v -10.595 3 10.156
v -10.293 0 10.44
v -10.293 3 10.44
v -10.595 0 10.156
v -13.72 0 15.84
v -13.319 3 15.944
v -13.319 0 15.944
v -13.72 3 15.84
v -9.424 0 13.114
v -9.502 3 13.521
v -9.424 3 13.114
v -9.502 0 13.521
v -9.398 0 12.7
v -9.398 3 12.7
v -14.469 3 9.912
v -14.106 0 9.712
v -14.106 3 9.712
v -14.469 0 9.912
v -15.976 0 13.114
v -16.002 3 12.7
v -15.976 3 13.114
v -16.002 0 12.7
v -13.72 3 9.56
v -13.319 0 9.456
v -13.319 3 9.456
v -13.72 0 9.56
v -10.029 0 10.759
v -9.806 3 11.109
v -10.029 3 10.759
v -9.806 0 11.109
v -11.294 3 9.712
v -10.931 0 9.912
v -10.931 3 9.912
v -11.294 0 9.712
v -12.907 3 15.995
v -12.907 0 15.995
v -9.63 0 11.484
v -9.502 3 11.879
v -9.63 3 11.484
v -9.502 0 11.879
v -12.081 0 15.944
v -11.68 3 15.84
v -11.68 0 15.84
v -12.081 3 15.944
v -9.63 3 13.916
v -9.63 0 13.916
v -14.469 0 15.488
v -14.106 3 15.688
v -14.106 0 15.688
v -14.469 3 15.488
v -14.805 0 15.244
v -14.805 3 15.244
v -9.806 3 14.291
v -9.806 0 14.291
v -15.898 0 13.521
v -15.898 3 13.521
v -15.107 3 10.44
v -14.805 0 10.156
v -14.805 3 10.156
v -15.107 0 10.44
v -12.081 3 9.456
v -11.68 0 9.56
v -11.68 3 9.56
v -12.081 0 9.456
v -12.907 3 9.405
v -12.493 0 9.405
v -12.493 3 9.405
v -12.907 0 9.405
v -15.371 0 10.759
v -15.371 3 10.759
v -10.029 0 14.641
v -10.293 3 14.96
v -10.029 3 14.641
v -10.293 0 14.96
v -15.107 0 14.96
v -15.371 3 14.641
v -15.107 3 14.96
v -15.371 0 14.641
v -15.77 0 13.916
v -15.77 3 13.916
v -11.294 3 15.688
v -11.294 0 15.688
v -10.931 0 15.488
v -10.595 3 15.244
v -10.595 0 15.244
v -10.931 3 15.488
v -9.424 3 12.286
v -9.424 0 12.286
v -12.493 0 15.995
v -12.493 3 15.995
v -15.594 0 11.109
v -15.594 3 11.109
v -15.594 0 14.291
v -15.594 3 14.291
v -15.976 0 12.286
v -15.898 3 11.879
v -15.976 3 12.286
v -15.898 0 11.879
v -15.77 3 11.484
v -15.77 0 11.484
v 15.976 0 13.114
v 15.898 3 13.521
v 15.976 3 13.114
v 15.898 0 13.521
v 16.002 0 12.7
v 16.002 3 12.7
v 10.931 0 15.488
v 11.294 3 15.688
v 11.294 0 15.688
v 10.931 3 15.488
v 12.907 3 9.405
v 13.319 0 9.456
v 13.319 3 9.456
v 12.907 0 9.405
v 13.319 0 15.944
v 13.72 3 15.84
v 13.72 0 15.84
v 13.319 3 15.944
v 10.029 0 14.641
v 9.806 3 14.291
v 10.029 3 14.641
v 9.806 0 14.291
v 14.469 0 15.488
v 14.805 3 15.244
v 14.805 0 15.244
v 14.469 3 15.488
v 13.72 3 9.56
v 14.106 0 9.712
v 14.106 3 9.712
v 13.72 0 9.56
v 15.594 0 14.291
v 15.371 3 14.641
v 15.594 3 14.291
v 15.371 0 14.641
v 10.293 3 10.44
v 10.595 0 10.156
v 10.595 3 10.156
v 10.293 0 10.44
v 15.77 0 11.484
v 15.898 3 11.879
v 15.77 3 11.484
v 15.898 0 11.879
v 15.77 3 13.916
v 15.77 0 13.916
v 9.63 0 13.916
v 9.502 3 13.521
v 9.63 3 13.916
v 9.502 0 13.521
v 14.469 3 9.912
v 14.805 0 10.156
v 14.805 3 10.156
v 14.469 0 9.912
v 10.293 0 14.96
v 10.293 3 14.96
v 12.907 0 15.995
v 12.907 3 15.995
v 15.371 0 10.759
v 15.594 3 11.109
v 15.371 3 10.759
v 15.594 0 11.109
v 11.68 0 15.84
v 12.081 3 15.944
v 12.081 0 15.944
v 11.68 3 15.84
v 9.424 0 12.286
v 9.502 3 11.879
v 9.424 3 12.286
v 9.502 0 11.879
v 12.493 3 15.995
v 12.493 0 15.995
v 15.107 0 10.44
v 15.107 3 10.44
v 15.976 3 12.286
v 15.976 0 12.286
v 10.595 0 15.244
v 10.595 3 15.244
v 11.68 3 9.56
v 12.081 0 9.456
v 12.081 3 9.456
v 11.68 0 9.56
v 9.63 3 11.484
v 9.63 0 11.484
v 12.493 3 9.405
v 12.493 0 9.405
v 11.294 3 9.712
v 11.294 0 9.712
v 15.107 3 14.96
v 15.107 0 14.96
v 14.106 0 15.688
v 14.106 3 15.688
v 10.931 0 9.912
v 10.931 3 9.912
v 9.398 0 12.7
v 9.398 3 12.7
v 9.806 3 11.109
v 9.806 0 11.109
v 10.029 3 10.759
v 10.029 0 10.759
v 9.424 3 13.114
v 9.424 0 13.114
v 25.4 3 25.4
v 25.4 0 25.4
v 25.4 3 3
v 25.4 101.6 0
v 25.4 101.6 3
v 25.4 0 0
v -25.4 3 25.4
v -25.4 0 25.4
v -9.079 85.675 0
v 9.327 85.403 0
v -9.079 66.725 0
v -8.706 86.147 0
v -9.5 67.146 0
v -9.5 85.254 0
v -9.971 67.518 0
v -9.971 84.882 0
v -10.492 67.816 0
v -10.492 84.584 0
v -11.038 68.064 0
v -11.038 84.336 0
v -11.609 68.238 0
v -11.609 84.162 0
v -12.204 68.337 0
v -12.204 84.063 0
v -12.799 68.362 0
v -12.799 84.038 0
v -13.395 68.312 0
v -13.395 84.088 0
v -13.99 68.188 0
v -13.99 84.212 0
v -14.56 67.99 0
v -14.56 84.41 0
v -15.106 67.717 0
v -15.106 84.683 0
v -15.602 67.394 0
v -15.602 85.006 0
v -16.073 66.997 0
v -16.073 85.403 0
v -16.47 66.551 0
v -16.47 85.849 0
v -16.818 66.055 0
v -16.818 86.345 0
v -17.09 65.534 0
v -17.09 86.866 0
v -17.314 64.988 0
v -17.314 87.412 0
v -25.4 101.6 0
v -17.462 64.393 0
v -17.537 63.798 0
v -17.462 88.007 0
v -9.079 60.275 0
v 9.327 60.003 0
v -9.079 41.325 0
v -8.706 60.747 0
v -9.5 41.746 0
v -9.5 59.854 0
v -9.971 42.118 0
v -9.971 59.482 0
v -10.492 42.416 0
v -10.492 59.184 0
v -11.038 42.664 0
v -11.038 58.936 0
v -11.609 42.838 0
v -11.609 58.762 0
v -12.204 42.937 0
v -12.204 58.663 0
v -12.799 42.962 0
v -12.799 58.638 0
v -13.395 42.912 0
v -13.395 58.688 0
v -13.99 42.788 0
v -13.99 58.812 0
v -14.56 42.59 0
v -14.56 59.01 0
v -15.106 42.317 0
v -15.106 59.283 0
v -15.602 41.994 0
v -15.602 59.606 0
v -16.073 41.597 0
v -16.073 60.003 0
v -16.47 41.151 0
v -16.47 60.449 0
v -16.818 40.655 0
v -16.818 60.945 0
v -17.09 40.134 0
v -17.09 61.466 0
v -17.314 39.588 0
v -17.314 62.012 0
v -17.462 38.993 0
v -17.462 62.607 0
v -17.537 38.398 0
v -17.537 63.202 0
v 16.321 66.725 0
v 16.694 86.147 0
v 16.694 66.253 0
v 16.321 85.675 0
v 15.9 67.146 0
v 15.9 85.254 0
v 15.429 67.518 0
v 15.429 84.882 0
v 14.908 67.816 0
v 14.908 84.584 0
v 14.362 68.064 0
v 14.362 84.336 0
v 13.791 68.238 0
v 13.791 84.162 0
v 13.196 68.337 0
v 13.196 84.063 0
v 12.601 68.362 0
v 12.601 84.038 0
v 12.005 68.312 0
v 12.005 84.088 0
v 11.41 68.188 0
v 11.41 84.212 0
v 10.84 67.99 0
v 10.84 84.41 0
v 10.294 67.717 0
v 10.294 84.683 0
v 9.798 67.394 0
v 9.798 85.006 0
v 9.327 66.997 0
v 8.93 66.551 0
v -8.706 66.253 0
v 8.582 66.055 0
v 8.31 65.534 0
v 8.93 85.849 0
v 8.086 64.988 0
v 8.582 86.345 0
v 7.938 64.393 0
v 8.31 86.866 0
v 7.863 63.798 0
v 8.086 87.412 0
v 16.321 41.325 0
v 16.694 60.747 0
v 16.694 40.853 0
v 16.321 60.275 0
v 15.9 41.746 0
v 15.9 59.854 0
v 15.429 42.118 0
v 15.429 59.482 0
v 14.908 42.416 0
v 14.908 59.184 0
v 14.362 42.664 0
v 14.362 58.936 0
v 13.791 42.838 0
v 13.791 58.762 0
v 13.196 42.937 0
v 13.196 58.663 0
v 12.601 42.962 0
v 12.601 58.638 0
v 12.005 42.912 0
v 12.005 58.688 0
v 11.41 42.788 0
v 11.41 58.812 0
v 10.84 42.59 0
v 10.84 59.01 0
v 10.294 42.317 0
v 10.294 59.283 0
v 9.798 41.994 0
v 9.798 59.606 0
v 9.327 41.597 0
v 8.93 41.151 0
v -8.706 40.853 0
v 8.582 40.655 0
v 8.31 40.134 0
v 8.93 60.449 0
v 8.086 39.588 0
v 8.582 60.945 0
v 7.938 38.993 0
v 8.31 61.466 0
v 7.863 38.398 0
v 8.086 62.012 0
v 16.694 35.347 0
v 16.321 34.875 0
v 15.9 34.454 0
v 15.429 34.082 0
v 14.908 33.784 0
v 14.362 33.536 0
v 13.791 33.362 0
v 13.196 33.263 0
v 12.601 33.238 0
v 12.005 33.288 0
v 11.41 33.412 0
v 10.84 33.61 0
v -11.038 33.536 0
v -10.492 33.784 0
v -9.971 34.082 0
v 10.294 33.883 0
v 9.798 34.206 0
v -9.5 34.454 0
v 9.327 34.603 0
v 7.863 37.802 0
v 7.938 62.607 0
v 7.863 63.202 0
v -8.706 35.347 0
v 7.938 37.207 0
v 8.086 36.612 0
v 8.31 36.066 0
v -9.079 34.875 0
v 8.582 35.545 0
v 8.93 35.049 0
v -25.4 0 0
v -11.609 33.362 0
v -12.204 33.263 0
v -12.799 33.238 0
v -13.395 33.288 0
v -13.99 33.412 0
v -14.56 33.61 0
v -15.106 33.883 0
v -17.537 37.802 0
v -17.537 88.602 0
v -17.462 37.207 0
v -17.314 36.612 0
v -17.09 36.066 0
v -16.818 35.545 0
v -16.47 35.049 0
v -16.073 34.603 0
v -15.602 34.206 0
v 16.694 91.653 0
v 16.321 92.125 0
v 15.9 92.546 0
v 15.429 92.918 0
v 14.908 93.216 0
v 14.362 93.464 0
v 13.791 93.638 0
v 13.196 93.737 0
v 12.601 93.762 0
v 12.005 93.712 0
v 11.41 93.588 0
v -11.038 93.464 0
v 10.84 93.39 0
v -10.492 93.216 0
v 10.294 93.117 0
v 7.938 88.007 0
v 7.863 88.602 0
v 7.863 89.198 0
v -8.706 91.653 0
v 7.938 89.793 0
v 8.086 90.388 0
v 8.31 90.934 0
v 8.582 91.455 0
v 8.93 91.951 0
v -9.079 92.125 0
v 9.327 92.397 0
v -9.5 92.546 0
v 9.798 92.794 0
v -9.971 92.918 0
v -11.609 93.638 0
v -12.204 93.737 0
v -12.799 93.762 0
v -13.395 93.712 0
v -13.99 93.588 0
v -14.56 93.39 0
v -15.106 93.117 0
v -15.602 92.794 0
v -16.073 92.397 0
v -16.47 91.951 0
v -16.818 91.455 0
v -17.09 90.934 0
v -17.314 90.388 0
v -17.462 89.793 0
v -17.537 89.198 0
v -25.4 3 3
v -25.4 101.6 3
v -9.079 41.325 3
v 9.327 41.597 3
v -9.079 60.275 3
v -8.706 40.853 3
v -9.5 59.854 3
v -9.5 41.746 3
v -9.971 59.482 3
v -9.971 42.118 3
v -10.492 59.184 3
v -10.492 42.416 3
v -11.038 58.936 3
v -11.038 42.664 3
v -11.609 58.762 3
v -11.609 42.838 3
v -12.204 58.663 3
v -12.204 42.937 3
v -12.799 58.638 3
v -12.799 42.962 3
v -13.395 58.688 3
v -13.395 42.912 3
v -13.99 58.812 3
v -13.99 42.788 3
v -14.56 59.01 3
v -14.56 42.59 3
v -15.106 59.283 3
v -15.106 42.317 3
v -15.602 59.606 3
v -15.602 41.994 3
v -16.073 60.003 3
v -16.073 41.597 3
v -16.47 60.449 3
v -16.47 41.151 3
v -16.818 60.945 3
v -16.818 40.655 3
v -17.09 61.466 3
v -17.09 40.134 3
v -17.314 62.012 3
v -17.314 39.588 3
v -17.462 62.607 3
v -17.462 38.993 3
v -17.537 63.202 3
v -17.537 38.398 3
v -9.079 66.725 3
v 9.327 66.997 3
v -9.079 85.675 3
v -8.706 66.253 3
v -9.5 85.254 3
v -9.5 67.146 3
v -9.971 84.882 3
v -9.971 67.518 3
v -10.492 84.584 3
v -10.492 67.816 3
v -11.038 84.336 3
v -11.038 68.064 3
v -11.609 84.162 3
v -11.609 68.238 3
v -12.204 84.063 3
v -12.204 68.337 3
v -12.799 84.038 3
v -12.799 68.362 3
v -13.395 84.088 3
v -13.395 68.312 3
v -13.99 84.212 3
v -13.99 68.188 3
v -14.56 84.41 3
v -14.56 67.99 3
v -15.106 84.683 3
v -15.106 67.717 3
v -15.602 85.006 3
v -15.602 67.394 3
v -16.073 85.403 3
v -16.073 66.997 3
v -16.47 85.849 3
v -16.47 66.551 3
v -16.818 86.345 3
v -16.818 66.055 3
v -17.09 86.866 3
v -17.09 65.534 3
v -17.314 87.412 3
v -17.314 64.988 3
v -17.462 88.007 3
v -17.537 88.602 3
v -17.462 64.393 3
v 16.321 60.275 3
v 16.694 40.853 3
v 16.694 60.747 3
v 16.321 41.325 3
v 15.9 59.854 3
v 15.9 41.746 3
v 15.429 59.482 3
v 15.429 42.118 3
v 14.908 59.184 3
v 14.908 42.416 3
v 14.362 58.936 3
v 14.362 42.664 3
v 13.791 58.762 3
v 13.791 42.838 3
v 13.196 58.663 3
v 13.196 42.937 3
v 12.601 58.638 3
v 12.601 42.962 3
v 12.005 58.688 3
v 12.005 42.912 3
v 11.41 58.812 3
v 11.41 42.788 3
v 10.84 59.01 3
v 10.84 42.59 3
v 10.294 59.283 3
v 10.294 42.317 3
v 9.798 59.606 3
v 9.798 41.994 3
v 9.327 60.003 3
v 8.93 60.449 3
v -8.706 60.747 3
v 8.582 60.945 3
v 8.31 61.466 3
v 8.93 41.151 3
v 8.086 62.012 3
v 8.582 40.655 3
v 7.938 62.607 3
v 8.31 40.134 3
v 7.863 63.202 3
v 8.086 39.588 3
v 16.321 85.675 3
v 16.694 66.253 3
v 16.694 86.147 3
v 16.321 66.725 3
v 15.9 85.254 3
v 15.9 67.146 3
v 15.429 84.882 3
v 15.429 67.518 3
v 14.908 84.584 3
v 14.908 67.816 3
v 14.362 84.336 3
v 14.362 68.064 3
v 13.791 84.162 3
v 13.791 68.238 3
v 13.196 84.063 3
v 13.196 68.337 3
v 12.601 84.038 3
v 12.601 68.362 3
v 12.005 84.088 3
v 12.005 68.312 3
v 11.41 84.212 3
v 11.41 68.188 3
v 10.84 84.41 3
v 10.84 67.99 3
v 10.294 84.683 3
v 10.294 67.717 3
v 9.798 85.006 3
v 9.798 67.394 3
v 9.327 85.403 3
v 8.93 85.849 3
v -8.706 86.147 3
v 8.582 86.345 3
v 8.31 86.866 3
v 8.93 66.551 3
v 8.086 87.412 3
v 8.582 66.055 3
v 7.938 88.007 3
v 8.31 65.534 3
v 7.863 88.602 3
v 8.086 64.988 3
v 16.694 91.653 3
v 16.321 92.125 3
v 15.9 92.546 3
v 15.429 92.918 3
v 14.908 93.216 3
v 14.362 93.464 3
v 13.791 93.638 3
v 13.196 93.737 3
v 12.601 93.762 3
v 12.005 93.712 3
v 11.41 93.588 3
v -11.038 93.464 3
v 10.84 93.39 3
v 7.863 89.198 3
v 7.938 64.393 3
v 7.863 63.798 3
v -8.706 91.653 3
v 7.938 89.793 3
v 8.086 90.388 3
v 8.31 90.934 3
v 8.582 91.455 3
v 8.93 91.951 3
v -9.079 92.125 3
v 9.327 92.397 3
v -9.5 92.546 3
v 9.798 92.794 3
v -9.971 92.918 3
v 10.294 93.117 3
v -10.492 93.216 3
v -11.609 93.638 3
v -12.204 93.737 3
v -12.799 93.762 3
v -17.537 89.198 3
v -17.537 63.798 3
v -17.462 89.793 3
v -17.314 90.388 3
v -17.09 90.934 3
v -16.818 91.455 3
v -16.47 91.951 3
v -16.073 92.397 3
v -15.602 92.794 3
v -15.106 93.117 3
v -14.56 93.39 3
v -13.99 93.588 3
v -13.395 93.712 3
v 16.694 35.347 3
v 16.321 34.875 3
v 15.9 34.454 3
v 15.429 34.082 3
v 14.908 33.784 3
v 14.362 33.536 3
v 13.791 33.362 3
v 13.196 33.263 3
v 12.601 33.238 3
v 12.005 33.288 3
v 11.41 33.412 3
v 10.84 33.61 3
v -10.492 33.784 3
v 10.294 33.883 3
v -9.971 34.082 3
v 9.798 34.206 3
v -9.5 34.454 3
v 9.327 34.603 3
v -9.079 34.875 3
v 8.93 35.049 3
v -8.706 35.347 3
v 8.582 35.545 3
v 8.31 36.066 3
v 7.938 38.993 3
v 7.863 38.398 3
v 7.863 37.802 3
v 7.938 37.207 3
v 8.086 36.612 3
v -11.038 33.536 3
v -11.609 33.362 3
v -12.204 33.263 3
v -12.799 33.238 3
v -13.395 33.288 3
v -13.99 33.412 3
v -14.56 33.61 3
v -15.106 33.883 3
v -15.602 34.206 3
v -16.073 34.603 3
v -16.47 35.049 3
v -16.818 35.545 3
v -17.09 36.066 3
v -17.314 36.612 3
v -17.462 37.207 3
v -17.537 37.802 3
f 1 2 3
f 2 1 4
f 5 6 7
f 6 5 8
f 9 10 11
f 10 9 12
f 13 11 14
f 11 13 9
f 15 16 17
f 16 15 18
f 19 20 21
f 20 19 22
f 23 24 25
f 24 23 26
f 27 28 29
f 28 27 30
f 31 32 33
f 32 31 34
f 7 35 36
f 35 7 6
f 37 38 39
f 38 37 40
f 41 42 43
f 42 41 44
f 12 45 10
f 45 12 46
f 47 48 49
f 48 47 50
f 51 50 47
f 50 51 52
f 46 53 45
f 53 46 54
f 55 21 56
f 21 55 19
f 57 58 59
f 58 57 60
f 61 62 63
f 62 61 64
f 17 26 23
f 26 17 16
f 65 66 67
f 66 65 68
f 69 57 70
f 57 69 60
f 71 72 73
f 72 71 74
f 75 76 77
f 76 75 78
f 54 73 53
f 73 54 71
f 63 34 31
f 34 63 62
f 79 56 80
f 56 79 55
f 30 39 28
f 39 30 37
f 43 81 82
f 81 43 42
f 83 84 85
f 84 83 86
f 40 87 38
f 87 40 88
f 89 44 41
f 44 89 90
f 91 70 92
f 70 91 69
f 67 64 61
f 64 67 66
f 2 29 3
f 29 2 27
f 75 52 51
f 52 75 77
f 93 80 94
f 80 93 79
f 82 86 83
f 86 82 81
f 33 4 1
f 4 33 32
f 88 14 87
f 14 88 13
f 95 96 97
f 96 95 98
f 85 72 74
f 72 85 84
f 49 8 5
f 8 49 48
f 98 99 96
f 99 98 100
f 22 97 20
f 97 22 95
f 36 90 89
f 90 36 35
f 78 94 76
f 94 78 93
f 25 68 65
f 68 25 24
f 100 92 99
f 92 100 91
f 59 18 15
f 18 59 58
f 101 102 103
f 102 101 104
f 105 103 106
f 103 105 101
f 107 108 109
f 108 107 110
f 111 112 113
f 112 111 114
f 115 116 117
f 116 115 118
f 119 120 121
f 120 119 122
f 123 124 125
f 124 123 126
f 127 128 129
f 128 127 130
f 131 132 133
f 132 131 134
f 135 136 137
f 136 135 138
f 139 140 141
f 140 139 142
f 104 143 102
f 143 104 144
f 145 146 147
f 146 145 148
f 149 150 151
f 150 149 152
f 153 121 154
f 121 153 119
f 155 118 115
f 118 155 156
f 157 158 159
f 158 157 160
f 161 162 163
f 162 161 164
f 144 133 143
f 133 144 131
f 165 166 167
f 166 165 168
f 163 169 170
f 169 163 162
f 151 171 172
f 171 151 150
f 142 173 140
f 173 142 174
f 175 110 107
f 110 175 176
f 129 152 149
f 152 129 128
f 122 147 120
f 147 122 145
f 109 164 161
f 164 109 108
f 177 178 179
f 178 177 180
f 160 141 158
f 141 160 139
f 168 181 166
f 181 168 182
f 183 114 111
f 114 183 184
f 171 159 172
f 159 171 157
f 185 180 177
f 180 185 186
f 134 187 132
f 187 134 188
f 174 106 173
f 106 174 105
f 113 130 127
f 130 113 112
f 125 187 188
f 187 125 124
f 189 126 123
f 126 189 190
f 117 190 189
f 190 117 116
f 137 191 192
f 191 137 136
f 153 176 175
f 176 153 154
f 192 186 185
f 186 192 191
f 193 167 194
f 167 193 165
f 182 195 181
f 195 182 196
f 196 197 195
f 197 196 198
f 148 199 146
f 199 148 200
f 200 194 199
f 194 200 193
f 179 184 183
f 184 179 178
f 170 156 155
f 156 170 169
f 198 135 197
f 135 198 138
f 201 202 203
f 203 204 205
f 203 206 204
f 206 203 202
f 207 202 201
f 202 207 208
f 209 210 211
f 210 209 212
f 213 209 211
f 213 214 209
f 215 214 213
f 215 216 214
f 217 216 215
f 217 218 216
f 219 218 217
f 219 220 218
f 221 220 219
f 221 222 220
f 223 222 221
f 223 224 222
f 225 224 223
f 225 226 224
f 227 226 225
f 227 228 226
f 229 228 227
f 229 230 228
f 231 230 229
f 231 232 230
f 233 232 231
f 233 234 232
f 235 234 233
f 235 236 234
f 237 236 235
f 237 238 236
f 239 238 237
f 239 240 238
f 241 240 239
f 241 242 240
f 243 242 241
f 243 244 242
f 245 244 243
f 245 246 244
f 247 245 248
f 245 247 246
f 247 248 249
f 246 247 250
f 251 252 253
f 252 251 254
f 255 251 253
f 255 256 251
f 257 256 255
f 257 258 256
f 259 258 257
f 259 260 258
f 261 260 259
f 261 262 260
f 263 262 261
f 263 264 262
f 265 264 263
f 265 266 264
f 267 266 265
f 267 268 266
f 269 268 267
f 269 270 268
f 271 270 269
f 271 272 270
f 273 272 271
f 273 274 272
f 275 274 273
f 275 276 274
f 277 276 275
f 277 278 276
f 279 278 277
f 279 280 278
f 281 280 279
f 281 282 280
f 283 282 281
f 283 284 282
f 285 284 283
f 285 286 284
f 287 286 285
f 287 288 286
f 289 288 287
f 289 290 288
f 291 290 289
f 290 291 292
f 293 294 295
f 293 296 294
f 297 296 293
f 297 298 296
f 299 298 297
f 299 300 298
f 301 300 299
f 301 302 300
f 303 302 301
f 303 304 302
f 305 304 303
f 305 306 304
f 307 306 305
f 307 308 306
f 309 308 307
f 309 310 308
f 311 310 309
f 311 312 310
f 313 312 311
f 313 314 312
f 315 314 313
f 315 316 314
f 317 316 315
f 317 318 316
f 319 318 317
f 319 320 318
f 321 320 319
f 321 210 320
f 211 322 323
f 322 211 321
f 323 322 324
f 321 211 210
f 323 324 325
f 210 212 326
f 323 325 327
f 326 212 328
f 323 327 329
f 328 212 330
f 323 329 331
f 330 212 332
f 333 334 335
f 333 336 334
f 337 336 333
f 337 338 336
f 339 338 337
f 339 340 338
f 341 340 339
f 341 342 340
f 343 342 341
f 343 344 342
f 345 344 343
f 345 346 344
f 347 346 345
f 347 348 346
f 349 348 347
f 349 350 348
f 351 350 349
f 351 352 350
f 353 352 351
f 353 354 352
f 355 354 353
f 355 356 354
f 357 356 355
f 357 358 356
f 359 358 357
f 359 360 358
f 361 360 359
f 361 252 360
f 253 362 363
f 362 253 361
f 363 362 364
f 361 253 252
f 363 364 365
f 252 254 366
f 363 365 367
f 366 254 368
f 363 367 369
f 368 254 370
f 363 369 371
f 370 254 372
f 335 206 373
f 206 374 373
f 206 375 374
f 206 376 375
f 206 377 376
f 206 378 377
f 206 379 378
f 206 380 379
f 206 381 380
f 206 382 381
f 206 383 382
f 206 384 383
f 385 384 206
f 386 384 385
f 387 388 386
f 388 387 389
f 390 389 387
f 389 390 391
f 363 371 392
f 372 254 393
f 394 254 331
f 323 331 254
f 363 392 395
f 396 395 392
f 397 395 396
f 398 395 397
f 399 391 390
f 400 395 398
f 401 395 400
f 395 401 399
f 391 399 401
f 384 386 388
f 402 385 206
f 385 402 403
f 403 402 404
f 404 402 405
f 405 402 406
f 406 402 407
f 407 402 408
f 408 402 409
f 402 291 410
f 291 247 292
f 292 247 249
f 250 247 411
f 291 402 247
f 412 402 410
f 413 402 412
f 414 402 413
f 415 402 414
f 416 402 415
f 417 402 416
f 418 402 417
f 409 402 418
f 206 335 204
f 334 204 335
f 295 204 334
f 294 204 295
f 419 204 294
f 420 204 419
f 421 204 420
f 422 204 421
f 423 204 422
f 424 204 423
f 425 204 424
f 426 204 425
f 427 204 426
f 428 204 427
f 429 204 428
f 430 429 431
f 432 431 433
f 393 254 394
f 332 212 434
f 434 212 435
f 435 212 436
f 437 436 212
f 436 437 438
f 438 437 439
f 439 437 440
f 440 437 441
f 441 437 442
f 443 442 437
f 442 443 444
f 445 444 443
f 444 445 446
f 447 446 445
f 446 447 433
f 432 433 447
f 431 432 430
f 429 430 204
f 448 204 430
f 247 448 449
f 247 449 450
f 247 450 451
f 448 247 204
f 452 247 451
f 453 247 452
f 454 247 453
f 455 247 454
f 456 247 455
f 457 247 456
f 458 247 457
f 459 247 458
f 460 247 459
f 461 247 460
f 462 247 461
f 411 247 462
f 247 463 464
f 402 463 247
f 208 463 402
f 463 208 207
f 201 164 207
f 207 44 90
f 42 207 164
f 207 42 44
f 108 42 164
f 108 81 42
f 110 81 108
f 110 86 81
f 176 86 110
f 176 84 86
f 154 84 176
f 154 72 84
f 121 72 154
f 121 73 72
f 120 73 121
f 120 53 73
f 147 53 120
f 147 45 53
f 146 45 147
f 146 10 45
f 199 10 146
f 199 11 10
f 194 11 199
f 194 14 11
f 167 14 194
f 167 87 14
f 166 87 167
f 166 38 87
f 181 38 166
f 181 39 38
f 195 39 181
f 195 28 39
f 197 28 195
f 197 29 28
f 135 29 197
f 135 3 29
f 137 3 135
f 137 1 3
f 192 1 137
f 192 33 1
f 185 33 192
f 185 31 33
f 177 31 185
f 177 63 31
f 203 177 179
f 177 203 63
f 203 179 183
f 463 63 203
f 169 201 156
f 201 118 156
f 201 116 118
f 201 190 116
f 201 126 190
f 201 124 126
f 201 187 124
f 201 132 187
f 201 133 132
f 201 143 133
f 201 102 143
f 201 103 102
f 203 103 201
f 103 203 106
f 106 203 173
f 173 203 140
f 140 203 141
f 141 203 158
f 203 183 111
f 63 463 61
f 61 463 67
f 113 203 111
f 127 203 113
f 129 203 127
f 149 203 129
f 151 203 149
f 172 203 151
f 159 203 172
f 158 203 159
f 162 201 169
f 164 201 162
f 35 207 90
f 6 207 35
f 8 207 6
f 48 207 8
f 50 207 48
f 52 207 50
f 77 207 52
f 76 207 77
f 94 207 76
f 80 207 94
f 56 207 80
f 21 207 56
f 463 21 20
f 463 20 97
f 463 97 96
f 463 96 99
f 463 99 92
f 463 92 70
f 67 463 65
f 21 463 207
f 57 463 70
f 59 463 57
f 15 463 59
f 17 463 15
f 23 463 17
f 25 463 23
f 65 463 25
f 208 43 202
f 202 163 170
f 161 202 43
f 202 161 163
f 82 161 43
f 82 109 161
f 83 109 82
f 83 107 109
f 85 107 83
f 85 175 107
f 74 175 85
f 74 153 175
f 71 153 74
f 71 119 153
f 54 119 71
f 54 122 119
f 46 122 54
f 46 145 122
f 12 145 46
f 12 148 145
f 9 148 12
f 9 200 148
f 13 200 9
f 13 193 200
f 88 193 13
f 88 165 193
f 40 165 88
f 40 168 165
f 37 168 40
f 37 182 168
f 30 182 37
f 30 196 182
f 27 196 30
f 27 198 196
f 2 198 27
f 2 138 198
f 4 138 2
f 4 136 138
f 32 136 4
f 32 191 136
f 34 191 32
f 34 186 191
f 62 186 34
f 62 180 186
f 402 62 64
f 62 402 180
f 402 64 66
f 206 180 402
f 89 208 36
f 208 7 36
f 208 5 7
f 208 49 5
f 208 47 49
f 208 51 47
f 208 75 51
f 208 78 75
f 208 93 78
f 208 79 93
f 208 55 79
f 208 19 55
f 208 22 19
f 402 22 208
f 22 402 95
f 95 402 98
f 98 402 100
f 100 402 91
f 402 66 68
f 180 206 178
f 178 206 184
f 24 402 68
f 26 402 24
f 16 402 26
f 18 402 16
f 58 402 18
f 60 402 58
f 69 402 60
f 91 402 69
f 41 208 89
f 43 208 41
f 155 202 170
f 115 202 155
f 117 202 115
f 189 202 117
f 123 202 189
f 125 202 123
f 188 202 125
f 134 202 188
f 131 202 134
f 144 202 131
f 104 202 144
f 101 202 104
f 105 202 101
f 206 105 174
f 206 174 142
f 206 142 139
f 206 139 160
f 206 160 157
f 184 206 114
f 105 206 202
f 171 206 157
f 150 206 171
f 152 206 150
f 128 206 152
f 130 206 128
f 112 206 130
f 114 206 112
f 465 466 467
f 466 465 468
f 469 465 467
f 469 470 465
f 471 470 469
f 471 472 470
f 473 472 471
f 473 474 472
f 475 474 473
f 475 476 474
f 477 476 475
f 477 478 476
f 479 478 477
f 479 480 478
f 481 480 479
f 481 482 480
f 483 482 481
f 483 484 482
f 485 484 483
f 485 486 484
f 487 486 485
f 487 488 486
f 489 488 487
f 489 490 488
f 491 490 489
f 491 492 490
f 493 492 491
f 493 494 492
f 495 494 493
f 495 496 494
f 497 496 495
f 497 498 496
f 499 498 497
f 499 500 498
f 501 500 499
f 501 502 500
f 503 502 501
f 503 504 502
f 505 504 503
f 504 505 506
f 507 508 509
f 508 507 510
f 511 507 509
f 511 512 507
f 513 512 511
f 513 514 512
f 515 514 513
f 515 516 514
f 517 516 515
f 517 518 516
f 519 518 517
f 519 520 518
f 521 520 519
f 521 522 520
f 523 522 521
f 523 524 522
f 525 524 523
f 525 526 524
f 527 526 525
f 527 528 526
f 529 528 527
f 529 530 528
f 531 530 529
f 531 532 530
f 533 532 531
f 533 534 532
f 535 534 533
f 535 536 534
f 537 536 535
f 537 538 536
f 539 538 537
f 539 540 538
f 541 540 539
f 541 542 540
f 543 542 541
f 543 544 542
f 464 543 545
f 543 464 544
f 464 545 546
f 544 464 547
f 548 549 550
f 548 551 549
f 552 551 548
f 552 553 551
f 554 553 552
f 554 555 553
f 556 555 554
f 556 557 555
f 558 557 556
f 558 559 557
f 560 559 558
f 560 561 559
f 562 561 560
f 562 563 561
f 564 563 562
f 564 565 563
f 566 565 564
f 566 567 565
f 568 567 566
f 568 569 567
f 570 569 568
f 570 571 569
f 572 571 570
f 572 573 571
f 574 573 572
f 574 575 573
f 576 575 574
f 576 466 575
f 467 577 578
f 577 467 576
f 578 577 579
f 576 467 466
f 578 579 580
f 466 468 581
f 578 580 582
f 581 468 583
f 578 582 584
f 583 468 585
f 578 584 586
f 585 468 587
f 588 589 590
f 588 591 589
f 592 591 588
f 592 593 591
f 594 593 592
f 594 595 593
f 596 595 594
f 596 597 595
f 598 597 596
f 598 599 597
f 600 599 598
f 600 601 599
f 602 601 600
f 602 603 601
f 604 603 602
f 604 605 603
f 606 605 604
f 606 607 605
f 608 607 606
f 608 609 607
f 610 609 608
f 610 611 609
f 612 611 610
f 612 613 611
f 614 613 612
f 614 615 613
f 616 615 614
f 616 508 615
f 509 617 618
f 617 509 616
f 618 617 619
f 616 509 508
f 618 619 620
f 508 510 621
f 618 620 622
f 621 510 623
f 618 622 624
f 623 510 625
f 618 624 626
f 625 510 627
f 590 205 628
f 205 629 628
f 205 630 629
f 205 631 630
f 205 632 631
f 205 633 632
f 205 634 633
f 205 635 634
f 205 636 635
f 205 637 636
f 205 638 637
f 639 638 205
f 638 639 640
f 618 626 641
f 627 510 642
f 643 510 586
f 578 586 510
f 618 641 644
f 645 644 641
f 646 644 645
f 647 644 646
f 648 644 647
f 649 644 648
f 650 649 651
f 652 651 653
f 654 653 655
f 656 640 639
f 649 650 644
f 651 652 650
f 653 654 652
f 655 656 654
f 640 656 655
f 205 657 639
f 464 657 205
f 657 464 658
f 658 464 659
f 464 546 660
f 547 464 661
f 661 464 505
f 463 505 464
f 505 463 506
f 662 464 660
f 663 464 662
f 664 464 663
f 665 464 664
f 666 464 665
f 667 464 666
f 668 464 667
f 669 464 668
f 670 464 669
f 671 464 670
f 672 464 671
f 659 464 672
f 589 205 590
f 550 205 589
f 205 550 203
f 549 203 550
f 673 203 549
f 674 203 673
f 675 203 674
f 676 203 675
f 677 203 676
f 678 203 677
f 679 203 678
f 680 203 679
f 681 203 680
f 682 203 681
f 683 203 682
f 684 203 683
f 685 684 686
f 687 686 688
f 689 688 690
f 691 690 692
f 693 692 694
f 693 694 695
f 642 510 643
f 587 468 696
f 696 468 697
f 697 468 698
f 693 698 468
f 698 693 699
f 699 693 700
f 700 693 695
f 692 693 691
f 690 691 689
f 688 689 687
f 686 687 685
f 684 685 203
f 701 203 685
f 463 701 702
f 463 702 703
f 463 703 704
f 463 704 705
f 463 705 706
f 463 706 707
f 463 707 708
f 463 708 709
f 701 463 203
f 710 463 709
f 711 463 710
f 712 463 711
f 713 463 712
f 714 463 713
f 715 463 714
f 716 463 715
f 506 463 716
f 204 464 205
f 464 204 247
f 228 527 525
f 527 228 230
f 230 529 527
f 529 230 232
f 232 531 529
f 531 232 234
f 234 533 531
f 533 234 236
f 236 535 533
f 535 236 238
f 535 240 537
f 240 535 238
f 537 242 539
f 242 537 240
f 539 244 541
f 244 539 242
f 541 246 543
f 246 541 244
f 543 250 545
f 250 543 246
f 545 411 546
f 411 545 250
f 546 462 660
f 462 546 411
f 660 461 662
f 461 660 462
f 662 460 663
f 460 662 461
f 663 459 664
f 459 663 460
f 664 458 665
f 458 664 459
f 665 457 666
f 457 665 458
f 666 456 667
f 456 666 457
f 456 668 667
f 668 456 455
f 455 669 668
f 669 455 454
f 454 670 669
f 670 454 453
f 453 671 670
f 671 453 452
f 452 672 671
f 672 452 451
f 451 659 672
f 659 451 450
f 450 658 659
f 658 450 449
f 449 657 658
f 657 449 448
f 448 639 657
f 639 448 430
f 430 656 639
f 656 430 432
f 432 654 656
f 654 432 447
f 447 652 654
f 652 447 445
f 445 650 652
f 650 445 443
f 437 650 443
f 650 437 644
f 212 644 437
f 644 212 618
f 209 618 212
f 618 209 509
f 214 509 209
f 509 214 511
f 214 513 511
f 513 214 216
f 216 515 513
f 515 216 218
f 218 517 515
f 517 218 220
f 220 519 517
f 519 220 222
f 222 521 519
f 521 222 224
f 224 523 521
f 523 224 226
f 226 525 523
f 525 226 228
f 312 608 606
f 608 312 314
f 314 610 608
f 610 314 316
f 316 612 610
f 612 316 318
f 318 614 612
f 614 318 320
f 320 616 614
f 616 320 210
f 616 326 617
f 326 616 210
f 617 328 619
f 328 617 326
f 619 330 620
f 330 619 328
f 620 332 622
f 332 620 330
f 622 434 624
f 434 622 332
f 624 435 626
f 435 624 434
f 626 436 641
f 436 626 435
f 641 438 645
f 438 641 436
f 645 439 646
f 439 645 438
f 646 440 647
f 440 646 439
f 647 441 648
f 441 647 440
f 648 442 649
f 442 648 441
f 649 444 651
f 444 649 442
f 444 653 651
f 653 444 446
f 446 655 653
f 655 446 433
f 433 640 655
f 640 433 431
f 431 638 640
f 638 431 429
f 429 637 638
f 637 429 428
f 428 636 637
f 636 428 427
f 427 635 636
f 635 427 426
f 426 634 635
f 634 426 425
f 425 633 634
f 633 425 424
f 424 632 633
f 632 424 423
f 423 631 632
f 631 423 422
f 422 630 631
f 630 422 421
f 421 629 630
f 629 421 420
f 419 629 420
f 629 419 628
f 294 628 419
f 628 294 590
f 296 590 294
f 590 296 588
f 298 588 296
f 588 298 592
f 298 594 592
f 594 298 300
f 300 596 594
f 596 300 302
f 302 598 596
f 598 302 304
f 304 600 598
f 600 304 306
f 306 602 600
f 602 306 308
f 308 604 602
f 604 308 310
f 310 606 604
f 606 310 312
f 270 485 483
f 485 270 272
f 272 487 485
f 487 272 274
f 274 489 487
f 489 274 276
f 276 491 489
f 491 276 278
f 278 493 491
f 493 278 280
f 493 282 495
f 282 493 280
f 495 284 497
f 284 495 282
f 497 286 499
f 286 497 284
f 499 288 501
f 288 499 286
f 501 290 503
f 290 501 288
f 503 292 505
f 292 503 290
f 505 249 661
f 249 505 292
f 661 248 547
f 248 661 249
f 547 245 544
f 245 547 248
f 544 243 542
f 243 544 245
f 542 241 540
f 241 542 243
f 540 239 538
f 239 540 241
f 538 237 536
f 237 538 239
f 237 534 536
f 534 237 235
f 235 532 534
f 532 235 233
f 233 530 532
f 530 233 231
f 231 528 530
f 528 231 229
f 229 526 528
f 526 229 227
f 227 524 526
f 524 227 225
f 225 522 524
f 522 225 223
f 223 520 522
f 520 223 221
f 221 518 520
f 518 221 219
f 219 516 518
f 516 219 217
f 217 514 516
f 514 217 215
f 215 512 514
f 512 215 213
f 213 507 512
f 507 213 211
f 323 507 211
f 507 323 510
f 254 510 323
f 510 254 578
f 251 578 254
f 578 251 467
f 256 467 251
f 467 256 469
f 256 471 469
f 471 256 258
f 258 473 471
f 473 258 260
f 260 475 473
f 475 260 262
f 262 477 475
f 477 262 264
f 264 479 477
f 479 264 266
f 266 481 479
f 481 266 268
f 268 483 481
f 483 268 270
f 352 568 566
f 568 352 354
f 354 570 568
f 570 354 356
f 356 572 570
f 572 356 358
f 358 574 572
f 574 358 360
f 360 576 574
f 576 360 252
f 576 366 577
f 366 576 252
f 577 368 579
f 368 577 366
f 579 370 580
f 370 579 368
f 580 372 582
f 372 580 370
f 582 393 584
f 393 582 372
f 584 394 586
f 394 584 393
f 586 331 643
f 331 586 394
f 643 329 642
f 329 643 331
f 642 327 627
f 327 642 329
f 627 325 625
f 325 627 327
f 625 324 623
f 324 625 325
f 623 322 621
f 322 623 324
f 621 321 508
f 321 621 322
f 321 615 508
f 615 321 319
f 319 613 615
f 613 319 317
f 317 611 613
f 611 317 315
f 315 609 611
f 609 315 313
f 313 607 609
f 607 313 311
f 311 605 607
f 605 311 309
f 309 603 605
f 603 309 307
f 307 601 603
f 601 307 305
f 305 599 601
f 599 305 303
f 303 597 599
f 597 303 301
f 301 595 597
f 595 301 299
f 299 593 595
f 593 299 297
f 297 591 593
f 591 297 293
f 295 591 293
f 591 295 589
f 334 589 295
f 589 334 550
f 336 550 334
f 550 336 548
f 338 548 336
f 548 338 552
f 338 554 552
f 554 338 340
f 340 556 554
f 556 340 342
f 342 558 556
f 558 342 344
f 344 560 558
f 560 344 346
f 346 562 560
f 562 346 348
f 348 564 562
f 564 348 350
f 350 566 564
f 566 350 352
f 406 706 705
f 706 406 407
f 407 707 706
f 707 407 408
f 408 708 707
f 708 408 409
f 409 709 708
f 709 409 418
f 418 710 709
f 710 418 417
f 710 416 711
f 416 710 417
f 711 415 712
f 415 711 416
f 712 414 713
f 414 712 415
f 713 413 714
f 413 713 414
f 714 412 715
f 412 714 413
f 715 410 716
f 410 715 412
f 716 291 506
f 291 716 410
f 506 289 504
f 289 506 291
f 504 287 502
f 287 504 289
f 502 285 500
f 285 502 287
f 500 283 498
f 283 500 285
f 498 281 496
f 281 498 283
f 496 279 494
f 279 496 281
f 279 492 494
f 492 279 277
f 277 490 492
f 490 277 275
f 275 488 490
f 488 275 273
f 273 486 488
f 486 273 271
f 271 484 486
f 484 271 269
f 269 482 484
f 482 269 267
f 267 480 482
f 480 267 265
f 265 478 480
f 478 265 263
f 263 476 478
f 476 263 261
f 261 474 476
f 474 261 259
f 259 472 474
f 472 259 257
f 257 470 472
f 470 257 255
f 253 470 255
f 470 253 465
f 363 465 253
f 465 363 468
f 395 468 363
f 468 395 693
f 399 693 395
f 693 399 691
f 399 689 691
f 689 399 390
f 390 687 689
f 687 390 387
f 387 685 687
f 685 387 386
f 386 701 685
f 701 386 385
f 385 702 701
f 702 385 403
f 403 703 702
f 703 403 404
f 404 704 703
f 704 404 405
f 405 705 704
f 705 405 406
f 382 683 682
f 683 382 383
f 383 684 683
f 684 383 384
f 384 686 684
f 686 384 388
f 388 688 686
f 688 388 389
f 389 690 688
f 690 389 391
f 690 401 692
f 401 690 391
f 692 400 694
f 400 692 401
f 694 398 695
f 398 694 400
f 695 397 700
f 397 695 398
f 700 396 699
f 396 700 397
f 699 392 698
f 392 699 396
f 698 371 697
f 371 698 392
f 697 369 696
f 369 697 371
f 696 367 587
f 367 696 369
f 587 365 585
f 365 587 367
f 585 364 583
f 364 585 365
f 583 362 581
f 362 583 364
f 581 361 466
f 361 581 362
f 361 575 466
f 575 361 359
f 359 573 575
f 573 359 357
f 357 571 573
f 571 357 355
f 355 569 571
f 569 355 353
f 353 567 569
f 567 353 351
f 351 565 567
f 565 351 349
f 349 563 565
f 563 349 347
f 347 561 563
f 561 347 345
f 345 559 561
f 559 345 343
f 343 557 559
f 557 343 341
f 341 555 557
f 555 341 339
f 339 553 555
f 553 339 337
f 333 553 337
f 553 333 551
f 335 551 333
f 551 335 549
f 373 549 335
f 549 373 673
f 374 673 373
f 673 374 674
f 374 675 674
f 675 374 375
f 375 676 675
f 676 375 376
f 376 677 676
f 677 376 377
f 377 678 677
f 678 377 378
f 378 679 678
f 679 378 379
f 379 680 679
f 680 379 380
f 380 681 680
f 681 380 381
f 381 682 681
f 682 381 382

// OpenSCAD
$fn=50;
inch = 25.4;

linear_extrude(3)
scale([inch, inch, 0]) 
import("./bnc.dxf");

difference() {

translate([-1*inch, 0, 0]) 
cube([2*inch, 3, 1*inch]);

union() {
   
translate([-0.5*inch, 0, 0.5*inch])
rotate([90, 0, 0])
cylinder(10, 0.13*inch, 0.13*inch, center=true);

translate([0.5*inch, 0, 0.5*inch])
rotate([90, 0, 0])
cylinder(10, 0.13*inch, 0.13*inch, center=true);

}
}
